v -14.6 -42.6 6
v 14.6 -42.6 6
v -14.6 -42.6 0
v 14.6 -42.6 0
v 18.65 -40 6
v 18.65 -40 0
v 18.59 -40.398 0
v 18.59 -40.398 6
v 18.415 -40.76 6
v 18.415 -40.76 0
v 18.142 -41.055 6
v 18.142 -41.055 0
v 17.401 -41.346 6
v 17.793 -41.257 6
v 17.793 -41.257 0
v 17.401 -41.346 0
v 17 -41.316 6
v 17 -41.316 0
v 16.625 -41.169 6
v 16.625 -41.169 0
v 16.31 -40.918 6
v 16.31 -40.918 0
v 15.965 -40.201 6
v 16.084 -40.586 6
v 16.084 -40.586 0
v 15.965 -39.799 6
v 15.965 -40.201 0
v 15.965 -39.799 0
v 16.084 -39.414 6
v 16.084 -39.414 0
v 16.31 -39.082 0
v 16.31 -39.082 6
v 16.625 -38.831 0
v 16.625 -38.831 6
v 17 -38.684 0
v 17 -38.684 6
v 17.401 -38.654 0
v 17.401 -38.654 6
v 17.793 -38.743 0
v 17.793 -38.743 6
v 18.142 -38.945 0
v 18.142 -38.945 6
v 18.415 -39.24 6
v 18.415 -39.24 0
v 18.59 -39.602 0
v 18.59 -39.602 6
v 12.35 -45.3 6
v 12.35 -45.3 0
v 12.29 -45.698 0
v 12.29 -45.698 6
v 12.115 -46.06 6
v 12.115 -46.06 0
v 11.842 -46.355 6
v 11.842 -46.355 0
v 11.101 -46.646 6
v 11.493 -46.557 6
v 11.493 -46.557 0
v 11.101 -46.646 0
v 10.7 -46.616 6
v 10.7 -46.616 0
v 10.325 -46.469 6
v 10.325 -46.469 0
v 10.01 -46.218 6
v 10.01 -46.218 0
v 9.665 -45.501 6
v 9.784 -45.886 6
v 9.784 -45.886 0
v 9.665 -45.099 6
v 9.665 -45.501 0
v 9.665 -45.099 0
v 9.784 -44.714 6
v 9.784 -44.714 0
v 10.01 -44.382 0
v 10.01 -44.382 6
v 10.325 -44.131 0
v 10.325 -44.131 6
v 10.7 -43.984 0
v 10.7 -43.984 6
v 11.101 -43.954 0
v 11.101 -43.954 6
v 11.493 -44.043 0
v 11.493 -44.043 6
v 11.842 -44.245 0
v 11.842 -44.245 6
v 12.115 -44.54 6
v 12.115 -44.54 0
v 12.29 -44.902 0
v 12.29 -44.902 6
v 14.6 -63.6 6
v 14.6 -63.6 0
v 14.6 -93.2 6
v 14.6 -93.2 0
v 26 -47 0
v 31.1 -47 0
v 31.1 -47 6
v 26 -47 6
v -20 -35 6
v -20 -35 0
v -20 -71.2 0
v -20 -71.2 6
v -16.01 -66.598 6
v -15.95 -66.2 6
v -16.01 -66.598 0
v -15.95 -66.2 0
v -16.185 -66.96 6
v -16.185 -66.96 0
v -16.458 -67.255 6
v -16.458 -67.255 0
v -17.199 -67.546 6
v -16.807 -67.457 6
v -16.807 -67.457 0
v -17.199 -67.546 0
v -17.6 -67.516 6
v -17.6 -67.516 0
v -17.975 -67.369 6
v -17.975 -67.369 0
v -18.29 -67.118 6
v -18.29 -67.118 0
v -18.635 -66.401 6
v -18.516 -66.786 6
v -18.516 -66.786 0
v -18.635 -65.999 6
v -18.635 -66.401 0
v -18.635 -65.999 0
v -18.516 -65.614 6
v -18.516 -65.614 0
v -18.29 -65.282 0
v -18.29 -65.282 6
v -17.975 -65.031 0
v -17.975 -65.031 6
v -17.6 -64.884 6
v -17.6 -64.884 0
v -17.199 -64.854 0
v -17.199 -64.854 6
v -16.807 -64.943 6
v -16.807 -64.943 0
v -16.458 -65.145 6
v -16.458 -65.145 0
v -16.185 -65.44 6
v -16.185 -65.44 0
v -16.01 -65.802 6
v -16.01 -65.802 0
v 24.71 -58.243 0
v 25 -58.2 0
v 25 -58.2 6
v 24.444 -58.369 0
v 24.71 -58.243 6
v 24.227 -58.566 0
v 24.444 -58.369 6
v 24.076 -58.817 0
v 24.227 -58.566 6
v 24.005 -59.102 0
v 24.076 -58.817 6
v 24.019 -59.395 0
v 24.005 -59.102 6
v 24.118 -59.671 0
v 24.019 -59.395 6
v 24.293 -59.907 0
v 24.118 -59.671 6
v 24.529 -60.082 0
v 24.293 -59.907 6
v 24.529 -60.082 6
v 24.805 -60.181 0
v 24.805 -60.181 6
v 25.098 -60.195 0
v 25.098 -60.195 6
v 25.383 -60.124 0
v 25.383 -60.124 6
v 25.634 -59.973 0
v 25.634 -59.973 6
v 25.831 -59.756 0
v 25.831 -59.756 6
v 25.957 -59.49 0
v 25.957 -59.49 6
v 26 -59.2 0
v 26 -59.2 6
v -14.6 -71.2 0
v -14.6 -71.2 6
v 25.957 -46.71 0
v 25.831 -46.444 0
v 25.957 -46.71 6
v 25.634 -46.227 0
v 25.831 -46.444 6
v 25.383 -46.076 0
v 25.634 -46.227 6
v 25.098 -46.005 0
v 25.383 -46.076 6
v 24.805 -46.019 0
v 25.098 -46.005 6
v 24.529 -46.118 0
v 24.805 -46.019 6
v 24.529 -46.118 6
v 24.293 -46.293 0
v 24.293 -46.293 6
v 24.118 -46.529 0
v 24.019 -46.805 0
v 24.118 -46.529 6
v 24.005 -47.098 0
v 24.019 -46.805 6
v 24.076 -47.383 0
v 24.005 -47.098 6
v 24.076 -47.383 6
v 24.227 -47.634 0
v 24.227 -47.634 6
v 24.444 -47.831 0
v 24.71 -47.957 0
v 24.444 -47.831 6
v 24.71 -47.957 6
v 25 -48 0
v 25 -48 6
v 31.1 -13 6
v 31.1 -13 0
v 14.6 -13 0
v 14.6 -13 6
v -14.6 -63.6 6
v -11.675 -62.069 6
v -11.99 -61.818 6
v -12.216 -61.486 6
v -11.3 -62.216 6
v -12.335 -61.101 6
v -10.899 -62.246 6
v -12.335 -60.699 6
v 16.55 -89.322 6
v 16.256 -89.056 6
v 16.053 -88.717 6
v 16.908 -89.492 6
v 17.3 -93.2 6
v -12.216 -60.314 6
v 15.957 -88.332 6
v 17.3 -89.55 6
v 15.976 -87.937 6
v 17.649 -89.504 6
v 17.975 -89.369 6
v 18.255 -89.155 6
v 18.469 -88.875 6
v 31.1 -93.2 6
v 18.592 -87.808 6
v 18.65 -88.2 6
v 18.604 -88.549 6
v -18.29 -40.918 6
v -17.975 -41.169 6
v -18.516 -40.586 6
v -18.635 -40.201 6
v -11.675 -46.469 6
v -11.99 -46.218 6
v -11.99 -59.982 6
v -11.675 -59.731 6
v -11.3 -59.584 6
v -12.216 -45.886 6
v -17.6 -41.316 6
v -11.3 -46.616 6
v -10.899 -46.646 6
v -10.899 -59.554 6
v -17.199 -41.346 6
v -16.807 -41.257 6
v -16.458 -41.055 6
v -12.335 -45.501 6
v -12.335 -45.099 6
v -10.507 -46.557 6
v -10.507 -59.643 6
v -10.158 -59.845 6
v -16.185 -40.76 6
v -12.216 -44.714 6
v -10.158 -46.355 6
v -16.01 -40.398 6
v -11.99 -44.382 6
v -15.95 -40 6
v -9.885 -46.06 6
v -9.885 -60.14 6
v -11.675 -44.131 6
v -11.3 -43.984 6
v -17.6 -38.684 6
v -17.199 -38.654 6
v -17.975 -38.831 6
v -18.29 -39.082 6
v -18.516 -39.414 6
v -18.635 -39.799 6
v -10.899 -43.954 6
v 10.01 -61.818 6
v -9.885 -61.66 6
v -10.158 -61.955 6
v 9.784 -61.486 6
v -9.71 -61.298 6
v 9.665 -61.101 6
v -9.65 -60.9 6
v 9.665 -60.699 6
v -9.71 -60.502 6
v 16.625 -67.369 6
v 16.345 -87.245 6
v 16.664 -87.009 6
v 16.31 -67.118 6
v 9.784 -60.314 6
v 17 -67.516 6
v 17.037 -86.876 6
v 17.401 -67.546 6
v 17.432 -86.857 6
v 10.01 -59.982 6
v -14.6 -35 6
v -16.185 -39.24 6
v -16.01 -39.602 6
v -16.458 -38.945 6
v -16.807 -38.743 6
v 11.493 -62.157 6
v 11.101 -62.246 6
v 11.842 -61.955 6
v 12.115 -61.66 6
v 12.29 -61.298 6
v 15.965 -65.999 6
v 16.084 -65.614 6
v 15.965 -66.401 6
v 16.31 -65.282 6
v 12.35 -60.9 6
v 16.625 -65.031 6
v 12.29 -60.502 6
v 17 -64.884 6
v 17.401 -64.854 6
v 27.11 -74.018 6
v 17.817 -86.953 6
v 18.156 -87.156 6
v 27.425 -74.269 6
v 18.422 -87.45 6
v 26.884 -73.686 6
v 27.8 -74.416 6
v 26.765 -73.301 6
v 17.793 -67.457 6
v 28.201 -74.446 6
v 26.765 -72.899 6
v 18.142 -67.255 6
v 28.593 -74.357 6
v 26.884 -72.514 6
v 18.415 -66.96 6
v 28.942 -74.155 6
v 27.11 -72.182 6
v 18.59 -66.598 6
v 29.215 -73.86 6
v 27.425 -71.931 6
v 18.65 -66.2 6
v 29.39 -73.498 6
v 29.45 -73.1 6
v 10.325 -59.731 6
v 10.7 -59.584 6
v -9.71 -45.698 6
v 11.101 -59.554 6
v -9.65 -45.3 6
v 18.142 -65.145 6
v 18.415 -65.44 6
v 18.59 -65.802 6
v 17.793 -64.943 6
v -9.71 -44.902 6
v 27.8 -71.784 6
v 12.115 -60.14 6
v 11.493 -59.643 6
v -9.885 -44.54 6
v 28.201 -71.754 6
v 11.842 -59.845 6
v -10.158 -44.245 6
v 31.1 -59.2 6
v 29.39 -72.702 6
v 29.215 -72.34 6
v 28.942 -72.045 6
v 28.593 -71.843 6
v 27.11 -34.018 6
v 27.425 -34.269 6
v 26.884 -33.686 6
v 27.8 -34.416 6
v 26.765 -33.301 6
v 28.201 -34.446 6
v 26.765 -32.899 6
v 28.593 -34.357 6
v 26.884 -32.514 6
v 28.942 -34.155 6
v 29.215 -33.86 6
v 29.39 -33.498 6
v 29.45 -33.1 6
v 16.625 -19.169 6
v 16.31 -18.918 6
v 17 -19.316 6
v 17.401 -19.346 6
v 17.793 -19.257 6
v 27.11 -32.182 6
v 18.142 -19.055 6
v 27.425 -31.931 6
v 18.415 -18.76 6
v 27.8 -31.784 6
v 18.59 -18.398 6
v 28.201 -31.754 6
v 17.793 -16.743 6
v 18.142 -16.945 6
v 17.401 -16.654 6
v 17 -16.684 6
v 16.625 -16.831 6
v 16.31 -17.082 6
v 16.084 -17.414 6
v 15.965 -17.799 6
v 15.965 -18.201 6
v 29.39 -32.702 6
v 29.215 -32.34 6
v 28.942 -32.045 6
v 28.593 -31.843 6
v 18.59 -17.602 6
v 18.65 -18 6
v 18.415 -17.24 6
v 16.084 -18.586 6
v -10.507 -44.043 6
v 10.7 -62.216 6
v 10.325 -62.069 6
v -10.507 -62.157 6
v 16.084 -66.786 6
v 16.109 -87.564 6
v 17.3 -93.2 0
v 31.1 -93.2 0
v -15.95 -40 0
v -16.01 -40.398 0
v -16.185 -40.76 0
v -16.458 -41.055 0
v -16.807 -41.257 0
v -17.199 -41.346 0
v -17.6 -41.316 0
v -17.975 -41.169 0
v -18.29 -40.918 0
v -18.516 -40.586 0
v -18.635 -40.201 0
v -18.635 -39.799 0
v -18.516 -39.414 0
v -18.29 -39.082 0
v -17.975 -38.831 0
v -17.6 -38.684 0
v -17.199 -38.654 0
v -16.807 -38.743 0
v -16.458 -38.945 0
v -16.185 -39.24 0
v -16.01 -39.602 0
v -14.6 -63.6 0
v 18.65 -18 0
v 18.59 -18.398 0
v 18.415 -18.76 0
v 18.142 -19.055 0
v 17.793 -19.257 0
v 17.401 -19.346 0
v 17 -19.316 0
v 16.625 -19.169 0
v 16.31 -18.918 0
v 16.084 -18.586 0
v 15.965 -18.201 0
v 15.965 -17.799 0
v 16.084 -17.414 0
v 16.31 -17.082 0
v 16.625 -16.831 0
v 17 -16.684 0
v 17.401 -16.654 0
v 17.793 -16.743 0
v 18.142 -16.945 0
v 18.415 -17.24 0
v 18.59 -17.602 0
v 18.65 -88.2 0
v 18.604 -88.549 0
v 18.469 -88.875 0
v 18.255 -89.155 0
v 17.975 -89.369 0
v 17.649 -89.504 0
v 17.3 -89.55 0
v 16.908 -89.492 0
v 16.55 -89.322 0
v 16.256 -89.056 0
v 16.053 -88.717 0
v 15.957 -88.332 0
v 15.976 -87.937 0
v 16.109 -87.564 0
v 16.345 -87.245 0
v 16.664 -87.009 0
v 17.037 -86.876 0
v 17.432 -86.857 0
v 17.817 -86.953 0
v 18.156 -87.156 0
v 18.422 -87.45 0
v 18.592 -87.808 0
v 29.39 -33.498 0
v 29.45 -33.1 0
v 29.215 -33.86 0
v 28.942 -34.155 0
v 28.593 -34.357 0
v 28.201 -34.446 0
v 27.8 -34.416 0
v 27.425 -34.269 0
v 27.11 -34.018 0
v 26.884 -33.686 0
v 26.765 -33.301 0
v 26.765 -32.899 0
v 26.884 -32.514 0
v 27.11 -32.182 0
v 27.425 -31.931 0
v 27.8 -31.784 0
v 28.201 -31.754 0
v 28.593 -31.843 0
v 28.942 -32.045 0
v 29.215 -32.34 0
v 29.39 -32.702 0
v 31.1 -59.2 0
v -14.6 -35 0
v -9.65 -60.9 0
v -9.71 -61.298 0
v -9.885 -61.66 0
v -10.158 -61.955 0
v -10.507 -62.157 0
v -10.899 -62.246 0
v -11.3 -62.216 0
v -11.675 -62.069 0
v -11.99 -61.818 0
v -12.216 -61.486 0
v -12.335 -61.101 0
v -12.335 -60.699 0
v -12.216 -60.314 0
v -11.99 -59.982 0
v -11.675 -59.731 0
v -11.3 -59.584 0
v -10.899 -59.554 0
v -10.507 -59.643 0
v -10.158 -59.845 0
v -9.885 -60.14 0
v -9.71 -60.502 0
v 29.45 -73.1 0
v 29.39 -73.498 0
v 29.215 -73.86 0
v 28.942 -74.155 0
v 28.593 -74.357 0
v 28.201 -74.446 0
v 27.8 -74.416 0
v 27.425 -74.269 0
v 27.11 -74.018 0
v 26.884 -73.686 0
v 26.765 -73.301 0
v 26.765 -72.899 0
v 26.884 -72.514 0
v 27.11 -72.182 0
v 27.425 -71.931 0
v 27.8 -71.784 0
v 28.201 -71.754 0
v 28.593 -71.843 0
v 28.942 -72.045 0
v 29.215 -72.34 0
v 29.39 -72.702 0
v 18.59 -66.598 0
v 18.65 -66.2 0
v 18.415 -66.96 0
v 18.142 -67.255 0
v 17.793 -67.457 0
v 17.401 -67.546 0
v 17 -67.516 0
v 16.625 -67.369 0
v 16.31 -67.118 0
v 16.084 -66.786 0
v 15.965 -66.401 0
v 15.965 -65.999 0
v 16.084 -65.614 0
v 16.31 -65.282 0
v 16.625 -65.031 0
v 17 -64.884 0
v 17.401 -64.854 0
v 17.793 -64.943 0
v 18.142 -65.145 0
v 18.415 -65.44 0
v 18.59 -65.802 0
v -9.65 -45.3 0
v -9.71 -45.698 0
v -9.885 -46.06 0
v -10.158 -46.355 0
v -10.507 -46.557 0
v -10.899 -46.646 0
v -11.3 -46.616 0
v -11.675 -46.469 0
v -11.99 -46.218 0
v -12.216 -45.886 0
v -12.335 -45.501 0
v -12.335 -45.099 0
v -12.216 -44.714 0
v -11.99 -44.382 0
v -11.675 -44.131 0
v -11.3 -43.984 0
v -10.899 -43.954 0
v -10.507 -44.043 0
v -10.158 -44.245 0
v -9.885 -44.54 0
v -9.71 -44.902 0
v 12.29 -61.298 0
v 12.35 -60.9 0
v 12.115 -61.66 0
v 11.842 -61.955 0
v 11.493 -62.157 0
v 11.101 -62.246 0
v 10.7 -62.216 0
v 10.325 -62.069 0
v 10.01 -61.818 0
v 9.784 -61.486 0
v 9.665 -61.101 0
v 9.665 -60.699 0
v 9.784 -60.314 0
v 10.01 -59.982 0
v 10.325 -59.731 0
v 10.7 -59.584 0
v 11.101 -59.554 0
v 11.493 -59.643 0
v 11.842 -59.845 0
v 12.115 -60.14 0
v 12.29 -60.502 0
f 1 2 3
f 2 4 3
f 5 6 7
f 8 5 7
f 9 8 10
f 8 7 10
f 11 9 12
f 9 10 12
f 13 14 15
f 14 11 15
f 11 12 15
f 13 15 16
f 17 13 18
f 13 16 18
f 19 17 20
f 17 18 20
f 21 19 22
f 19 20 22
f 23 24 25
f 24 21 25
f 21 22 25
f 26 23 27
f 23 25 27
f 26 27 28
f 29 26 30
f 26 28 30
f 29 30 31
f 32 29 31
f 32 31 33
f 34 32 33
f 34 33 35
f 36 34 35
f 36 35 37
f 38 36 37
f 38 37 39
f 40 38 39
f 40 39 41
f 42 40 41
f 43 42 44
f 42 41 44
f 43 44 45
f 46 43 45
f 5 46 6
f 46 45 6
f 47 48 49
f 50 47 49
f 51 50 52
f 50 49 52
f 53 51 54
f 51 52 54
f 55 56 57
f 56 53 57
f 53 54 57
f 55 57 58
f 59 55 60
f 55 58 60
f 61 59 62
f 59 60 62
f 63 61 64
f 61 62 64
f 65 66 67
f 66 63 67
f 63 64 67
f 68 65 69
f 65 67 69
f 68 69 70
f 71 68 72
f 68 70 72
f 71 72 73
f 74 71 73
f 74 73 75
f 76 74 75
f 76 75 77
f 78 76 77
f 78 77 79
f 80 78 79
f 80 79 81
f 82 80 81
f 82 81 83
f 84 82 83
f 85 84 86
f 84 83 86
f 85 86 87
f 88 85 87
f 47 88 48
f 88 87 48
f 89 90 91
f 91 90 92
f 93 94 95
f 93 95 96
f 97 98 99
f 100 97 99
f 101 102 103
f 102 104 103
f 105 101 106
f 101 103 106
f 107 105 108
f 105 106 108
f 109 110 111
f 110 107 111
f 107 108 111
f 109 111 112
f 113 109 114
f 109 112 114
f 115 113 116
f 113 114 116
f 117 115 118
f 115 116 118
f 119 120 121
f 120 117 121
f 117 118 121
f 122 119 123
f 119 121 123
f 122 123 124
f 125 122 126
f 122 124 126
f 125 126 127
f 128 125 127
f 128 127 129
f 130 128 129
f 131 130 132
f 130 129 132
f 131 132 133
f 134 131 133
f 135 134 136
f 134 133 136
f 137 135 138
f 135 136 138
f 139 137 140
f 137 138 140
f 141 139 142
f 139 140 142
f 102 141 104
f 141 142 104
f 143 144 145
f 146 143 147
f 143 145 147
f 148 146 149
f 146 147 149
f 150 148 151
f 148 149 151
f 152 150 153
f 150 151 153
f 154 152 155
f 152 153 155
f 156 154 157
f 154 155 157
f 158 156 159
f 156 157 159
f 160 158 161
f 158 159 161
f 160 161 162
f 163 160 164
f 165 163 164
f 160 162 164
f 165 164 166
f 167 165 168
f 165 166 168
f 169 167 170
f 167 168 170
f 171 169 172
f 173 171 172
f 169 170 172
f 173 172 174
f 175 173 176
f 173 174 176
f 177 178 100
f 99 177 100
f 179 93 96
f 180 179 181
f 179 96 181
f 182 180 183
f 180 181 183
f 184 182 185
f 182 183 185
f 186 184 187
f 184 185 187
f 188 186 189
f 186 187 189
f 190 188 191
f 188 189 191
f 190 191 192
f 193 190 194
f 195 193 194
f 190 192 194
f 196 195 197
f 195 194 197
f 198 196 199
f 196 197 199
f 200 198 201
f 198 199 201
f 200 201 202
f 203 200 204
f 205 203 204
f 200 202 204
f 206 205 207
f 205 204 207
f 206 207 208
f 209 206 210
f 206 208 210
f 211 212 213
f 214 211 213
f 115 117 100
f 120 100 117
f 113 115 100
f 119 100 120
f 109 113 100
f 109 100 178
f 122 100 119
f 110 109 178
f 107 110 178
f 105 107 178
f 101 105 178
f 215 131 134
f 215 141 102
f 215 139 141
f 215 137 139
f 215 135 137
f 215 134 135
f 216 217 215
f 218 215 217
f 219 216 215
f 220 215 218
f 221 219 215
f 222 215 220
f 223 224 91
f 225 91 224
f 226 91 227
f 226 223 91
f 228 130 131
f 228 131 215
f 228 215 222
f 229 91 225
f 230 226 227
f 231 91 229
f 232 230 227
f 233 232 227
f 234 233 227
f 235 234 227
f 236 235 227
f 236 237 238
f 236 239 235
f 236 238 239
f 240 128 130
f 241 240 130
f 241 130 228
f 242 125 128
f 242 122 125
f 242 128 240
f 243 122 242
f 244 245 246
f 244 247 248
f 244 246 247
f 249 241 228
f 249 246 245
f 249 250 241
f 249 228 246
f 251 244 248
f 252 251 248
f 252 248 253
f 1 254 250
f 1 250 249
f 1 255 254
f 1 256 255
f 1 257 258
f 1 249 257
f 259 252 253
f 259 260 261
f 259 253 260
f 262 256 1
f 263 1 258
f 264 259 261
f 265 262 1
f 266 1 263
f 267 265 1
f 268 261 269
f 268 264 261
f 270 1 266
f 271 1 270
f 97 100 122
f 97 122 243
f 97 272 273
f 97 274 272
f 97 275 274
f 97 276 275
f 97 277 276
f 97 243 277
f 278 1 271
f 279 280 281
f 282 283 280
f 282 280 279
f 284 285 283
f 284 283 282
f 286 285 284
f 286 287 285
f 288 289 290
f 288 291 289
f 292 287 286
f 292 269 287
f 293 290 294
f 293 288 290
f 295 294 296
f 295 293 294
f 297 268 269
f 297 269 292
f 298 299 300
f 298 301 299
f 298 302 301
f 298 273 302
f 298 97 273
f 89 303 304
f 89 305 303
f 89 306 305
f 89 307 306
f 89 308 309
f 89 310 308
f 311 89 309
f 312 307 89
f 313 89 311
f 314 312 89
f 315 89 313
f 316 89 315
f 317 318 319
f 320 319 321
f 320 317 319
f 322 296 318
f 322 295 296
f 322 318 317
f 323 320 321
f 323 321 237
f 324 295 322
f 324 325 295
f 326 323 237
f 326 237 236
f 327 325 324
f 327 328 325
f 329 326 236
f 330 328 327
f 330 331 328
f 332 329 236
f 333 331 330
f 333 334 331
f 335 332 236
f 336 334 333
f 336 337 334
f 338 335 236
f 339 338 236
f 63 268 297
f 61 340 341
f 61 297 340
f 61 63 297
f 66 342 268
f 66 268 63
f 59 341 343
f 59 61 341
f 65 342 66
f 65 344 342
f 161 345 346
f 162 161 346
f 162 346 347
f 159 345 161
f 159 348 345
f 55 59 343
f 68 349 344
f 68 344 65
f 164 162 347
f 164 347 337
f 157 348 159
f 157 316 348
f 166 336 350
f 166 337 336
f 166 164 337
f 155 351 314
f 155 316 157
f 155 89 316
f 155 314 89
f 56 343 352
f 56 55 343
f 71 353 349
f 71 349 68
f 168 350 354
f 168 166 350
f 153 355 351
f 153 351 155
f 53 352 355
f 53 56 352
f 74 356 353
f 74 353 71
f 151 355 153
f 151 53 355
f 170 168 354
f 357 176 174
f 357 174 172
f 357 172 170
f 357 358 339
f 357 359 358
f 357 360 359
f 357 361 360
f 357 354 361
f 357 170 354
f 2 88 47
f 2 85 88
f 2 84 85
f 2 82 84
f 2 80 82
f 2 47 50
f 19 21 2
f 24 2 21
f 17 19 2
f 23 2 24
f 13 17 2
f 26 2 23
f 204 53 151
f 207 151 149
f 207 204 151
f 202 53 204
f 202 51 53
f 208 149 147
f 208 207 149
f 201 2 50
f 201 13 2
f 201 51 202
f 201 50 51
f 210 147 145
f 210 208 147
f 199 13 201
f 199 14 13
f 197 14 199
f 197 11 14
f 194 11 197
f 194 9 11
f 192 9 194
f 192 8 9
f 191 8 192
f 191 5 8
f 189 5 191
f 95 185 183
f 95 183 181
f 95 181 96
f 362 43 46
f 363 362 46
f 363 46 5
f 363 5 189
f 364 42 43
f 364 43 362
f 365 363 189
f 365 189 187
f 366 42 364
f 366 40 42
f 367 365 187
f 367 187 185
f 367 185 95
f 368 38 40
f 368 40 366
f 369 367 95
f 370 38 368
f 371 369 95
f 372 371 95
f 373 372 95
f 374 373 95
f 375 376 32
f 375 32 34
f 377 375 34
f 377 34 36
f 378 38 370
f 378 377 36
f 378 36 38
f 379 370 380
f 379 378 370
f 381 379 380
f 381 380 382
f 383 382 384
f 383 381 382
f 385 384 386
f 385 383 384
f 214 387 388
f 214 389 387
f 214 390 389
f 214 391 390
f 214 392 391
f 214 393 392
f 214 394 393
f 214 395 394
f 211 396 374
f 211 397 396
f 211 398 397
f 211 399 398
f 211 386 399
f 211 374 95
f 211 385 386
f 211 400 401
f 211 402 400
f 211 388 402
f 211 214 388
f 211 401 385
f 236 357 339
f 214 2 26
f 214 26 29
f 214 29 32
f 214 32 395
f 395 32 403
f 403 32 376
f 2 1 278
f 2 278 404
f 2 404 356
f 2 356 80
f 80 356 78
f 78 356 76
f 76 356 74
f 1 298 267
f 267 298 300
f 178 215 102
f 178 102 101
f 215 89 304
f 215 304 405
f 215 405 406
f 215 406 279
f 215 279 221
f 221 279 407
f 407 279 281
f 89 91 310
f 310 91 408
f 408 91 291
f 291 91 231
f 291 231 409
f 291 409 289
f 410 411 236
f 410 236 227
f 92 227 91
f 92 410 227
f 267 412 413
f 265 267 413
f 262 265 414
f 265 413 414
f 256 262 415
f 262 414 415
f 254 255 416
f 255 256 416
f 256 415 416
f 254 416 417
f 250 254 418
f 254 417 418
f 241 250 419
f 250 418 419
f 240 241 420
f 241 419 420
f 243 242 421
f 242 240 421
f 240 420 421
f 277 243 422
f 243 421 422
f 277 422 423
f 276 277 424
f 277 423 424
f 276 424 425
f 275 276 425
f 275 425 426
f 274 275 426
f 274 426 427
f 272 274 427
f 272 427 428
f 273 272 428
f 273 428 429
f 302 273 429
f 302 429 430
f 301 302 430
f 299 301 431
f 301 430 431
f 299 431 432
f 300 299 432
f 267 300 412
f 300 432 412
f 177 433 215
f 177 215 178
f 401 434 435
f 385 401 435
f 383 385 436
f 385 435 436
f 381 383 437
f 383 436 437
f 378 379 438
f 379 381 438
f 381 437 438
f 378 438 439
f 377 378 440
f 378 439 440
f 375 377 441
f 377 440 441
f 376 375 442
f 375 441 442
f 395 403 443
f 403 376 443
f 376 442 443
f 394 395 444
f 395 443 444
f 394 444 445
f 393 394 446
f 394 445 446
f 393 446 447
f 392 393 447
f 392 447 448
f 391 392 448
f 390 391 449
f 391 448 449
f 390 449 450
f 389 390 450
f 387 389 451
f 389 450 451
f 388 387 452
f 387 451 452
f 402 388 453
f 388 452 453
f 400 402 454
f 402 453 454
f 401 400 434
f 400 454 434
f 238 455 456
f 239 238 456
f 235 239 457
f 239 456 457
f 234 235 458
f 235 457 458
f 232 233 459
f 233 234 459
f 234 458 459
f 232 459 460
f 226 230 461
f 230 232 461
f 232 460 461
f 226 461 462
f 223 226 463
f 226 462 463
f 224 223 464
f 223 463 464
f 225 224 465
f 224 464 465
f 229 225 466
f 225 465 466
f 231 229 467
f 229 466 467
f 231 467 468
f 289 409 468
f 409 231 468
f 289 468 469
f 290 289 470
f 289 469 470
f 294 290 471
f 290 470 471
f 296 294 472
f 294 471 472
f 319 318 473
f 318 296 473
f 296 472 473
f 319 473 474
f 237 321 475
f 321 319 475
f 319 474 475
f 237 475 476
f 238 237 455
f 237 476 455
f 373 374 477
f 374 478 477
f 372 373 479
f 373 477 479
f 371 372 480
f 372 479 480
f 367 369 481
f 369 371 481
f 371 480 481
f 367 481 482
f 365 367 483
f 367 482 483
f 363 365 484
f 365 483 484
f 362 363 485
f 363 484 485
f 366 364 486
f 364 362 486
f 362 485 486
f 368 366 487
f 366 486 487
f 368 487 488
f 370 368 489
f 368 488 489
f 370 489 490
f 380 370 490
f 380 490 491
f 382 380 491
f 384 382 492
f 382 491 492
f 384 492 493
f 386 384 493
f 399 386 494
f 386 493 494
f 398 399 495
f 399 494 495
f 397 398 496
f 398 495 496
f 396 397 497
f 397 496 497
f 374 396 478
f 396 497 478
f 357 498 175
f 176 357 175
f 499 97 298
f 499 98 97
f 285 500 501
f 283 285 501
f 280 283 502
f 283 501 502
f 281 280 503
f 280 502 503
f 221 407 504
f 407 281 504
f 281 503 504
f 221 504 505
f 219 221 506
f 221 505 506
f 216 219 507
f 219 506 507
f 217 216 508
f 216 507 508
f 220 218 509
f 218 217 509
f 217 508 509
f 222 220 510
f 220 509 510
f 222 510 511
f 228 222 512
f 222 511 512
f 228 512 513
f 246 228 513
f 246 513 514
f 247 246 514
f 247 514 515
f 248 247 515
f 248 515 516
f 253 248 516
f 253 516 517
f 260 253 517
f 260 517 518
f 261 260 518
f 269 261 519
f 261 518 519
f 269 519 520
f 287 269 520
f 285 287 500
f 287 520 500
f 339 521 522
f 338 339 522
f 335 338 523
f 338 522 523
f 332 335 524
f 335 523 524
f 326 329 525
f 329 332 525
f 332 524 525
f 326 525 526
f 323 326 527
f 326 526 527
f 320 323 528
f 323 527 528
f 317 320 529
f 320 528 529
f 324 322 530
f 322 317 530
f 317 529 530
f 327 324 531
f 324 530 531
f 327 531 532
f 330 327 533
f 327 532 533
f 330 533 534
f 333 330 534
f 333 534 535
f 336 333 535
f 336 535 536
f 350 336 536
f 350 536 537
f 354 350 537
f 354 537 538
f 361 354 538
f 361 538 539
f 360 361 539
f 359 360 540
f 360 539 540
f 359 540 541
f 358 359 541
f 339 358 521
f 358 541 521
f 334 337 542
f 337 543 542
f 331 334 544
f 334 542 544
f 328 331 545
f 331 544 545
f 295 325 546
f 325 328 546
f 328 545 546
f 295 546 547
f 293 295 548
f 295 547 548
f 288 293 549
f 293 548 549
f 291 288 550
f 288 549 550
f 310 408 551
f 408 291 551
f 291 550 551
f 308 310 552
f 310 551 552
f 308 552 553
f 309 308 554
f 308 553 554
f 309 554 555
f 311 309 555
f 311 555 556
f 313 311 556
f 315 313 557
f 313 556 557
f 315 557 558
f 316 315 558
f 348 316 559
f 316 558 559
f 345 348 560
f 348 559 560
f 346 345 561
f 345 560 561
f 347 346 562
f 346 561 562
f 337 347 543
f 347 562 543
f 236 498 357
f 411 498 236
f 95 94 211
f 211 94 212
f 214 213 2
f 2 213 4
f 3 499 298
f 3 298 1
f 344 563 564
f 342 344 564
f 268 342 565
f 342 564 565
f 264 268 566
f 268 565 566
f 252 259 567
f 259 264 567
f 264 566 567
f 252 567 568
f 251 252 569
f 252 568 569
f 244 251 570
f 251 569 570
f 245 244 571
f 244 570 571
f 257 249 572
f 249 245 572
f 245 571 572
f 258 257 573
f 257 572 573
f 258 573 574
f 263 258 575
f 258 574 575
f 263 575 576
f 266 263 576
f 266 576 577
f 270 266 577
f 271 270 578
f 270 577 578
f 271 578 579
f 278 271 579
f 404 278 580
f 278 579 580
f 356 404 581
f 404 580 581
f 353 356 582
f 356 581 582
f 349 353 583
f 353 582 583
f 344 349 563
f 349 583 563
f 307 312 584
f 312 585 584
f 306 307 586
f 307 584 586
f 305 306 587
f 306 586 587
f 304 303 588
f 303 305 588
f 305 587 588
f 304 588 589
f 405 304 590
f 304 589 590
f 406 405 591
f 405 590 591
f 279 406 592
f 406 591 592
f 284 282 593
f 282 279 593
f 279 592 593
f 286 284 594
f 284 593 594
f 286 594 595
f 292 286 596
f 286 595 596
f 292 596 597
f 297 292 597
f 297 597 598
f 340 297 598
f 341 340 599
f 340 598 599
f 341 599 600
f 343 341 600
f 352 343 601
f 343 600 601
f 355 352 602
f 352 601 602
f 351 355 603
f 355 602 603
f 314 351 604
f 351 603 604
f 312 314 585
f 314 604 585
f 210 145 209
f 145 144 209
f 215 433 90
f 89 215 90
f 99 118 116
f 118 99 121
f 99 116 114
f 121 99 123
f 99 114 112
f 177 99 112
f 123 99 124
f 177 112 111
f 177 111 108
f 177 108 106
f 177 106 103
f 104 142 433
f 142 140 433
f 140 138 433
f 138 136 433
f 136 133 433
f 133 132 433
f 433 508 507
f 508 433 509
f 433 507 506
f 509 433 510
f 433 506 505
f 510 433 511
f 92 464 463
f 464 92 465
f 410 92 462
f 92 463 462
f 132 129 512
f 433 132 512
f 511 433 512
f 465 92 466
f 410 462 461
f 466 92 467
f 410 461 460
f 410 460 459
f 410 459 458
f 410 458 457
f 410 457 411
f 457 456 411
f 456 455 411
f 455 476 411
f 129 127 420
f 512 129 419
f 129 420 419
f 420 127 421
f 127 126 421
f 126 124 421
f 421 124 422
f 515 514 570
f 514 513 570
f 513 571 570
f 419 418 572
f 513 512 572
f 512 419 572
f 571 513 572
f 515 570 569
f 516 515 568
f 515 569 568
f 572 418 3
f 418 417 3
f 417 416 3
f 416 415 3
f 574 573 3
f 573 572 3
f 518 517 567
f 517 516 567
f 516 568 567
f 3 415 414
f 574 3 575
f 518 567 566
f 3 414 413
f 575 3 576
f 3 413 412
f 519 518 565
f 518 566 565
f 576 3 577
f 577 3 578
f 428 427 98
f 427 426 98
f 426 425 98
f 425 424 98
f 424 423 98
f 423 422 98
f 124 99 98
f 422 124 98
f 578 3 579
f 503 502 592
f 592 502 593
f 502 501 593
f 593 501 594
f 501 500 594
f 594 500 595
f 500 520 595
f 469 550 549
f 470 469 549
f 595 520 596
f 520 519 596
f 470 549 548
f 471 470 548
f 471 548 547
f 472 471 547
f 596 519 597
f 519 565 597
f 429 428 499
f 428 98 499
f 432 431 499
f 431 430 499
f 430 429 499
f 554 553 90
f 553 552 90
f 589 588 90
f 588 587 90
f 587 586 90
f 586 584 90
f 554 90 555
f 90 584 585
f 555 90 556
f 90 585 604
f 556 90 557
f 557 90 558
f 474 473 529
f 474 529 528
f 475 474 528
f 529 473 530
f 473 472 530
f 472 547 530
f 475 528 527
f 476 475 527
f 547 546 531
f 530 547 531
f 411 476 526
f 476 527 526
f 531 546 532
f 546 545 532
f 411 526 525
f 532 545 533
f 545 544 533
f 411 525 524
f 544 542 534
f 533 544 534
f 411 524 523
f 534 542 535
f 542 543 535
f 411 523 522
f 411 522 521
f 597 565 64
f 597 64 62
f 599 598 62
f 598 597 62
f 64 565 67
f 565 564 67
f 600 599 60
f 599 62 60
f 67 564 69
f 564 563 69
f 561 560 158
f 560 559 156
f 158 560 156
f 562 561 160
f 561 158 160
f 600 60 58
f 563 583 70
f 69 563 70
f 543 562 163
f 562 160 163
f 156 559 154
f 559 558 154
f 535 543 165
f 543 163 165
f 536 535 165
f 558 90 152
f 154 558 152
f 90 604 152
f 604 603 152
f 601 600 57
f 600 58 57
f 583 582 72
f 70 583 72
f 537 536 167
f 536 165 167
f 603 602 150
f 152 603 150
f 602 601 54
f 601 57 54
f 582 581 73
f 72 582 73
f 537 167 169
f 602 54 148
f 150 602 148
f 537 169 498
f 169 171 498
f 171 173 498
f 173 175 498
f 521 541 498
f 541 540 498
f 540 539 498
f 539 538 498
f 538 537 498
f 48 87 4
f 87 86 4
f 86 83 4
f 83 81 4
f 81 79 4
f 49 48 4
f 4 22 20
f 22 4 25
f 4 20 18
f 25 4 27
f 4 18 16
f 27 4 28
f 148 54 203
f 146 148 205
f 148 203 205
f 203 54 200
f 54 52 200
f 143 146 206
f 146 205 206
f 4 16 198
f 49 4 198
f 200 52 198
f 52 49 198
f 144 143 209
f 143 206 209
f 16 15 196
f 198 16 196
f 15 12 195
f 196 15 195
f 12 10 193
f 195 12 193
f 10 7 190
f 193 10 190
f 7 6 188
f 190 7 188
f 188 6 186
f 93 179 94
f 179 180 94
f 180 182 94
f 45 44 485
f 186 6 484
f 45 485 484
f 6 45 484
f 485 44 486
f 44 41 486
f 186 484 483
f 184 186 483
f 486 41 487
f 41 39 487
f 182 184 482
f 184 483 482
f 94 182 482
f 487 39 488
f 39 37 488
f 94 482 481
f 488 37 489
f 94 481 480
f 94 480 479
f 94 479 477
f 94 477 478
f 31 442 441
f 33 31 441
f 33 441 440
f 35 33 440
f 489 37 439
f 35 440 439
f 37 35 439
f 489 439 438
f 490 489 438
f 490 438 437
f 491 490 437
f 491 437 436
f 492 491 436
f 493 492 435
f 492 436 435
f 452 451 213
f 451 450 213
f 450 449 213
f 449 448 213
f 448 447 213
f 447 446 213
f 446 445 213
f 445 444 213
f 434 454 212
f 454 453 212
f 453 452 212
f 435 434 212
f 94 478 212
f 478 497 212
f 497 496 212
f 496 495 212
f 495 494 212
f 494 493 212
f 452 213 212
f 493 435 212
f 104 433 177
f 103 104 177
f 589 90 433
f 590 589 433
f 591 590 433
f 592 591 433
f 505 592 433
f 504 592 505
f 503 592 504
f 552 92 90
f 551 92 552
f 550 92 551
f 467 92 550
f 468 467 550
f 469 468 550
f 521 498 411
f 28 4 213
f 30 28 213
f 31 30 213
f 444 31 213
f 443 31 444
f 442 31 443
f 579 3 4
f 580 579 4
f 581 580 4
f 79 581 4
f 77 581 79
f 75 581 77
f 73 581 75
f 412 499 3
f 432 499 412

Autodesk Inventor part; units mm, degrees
ref_plane "YZ Plane" through (0, 0, 0) normal (1, 0, 0) x (0, 1, 0)
ref_plane "XZ Plane" through (0, 0, 0) normal (0, 1, 0) x (-1, 0, 0)
ref_plane "XY Plane" through (0, 0, 0) normal (0, 0, 1) x (1, 0, 0)
ref_plane "작업 평면1" through (0, 0, 0) normal (0, 0, 1) x (1, 0, 0)
sketch "스케치1" plane through (0, 0, 0) normal (0, 0, 1) x (1, 0, 0)
  arc A0 (-19.5808, 6.2636) -> (-20.1, 4.5766) centre (-17.1, 4.5766) ccw projected
  line L0 (-20.1, -39.6766) -> (-20.1, 4.5766) projected
  arc A1 (-20.1, -39.6766) -> (-19.5808, -41.3636) centre (-17.1, -39.6766) ccw projected
  line L1 (-15.8929, -46.7869) -> (-19.5808, -41.3636) projected
  arc A2 (-15.8929, -46.7869) -> (-13.4121, -48.1) centre (-13.4121, -45.1) ccw projected
  line L2 (13.4121, -48.1) -> (-13.4121, -48.1) projected
  arc A3 (13.4121, -48.1) -> (15.8929, -46.7869) centre (13.4121, -45.1) ccw projected
  line L3 (19.5808, -41.3636) -> (15.8929, -46.7869) projected
  arc A4 (19.5808, -41.3636) -> (20.1, -39.6766) centre (17.1, -39.6766) ccw projected
  line L4 (20.1, 4.5766) -> (20.1, -39.6766) projected
  arc A5 (20.1, 4.5766) -> (19.5808, 6.2636) centre (17.1, 4.5766) ccw projected
  line L5 (15.5953, 12.1246) -> (19.5808, 6.2636) projected
  arc A6 (15.5953, 12.1246) -> (13.9414, 13) centre (13.9414, 11) ccw projected
  line L6 (7.65, 13) -> (13.9414, 13) projected
  arc A7 (9.15, 11.5) -> (7.65, 13) centre (7.65, 11.5) ccw projected
  line L7 (9.15, 11.5) -> (9.15, 10) projected
  arc A8 (9.15, 10) -> (11.5, 7.65) centre (11.5, 10) ccw projected
  line L8 (11.5, 7.65) -> (13.5, 7.65) projected
  arc A9 (14.5, 6.65) -> (13.5, 7.65) centre (13.5, 6.65) ccw projected
  line L9 (14.5, 6.65) -> (14.5, -36.15) projected
  arc A10 (13.5, -37.15) -> (14.5, -36.15) centre (13.5, -36.15) ccw projected
  line L10 (13.5, -37.15) -> (11.5, -37.15) projected
  arc A11 (11.5, -37.15) -> (9.15, -39.5) centre (11.5, -39.5) ccw projected
  line L11 (9.15, -39.5) -> (9.15, -41.5) projected
  arc A12 (8.15, -42.5) -> (9.15, -41.5) centre (8.15, -41.5) ccw projected
  line L12 (8.15, -42.5) -> (-8.15, -42.5) projected
  arc A13 (-9.15, -41.5) -> (-8.15, -42.5) centre (-8.15, -41.5) ccw projected
  line L13 (-9.15, -41.5) -> (-9.15, -39.5) projected
  arc A14 (-9.15, -39.5) -> (-11.5, -37.15) centre (-11.5, -39.5) ccw projected
  line L14 (-11.5, -37.15) -> (-13.5, -37.15) projected
  arc A15 (-14.5, -36.15) -> (-13.5, -37.15) centre (-13.5, -36.15) ccw projected
  line L15 (-14.5, -36.15) -> (-14.5, 6.65) projected
  arc A16 (-13.5, 7.65) -> (-14.5, 6.65) centre (-13.5, 6.65) ccw projected
  line L16 (-13.5, 7.65) -> (-11.5, 7.65) projected
  arc A17 (-11.5, 7.65) -> (-9.15, 10) centre (-11.5, 10) ccw projected
  line L17 (-9.15, 10) -> (-9.15, 11.5) projected
  arc A18 (-7.65, 13) -> (-9.15, 11.5) centre (-7.65, 11.5) ccw projected
  line L18 (-13.9414, 13) -> (-7.65, 13) projected
  arc A19 (-13.9414, 13) -> (-15.5953, 12.1246) centre (-13.9414, 11) ccw projected
  line L19 (-19.5808, 6.2636) -> (-15.5953, 12.1246) projected
  circle A20 centre (17.3, 4) radius 1.35 projected
  circle A21 centre (17.3, -18) radius 1.35 projected
  circle A22 centre (11, -45.3) radius 1.35 projected
  circle A23 centre (-17.3, 4) radius 1.35 projected
  circle A24 centre (-17.3, -18) radius 1.35 projected
  circle A25 centre (-11, -45.3) radius 1.35 projected
  circle A26 centre (17.3, -40) radius 1.35 projected
  circle A27 centre (-17.3, -40) radius 1.35 projected
  arc A28 (19.5808, -112.4636) -> (20.1, -110.7766) centre (17.1, -110.7766) ccw projected
  line L20 (20.1, -66.5234) -> (20.1, -110.7766) projected
  arc A29 (20.1, -66.5234) -> (19.5808, -64.8364) centre (17.1, -66.5234) ccw projected
  line L21 (15.8929, -59.4131) -> (19.5808, -64.8364) projected
  arc A30 (15.8929, -59.4131) -> (13.4121, -58.1) centre (13.4121, -61.1) ccw projected
  line L22 (-13.4121, -58.1) -> (13.4121, -58.1) projected
  arc A31 (-13.4121, -58.1) -> (-15.8929, -59.4131) centre (-13.4121, -61.1) ccw projected
  line L23 (-19.5808, -64.8364) -> (-15.8929, -59.4131) projected
  arc A32 (-19.5808, -64.8364) -> (-20.1, -66.5234) centre (-17.1, -66.5234) ccw projected
  line L24 (-20.1, -110.7766) -> (-20.1, -66.5234) projected
  arc A33 (-20.1, -110.7766) -> (-19.5808, -112.4636) centre (-17.1, -110.7766) ccw projected
  line L25 (-15.5953, -118.3246) -> (-19.5808, -112.4636) projected
  arc A34 (-15.5953, -118.3246) -> (-13.9414, -119.2) centre (-13.9414, -117.2) ccw projected
  line L26 (-7.65, -119.2) -> (-13.9414, -119.2) projected
  arc A35 (-9.15, -117.7) -> (-7.65, -119.2) centre (-7.65, -117.7) ccw projected
  line L27 (-9.15, -117.7) -> (-9.15, -116.2) projected
  arc A36 (-9.15, -116.2) -> (-11.5, -113.85) centre (-11.5, -116.2) ccw projected
  line L28 (-11.5, -113.85) -> (-13.5, -113.85) projected
  arc A37 (-14.5, -112.85) -> (-13.5, -113.85) centre (-13.5, -112.85) ccw projected
  line L29 (-14.5, -112.85) -> (-14.5, -70.05) projected
  arc A38 (-13.5, -69.05) -> (-14.5, -70.05) centre (-13.5, -70.05) ccw projected
  line L30 (-13.5, -69.05) -> (-11.5, -69.05) projected
  arc A39 (-11.5, -69.05) -> (-9.15, -66.7) centre (-11.5, -66.7) ccw projected
  line L31 (-9.15, -66.7) -> (-9.15, -64.7) projected
  arc A40 (-8.15, -63.7) -> (-9.15, -64.7) centre (-8.15, -64.7) ccw projected
  line L32 (-8.15, -63.7) -> (8.15, -63.7) projected
  arc A41 (9.15, -64.7) -> (8.15, -63.7) centre (8.15, -64.7) ccw projected
  line L33 (9.15, -64.7) -> (9.15, -66.7) projected
  arc A42 (9.15, -66.7) -> (11.5, -69.05) centre (11.5, -66.7) ccw projected
  line L34 (11.5, -69.05) -> (13.5, -69.05) projected
  arc A43 (14.5, -70.05) -> (13.5, -69.05) centre (13.5, -70.05) ccw projected
  line L35 (14.5, -70.05) -> (14.5, -112.85) projected
  arc A44 (13.5, -113.85) -> (14.5, -112.85) centre (13.5, -112.85) ccw projected
  line L36 (13.5, -113.85) -> (11.5, -113.85) projected
  arc A45 (11.5, -113.85) -> (9.15, -116.2) centre (11.5, -116.2) ccw projected
  line L37 (9.15, -116.2) -> (9.15, -117.7) projected
  arc A46 (7.65, -119.2) -> (9.15, -117.7) centre (7.65, -117.7) ccw projected
  line L38 (13.9414, -119.2) -> (7.65, -119.2) projected
  arc A47 (13.9414, -119.2) -> (15.5953, -118.3246) centre (13.9414, -117.2) ccw projected
  line L39 (19.5808, -112.4636) -> (15.5953, -118.3246) projected
  circle A48 centre (-17.3, -110.2) radius 1.35 projected
  circle A49 centre (-17.3, -88.2) radius 1.35 projected
  circle A50 centre (-11, -60.9) radius 1.35 projected
  circle A51 centre (17.3, -110.2) radius 1.35 projected
  circle A52 centre (17.3, -88.2) radius 1.35 projected
  circle A53 centre (11, -60.9) radius 1.35 projected
  circle A54 centre (-17.3, -66.2) radius 1.35 projected
  circle A55 centre (17.3, -66.2) radius 1.35 projected
  line L40 (14.6, -36.15) -> (14.6, 6.65)
  arc A56 (14.6, 6.65) -> (13.5, 7.75) centre (13.5, 6.65) ccw
  line L41 (13.5, 7.75) -> (11.5, 7.75)
  arc A57 (9.25, 10) -> (11.5, 7.75) centre (11.5, 10) ccw
  line L42 (9.25, 10) -> (9.25, 11.5)
  arc A58 (9.25, 11.5) -> (8.4246, 12.9) centre (7.65, 11.5) ccw
  line L43 (8.4246, 12.9) -> (13.9414, 12.9)
  arc A59 (15.5126, 12.0684) -> (13.9414, 12.9) centre (13.9414, 11) ccw
  line L44 (15.5126, 12.0684) -> (19.4981, 6.2073)
  arc A60 (20, 4.5766) -> (19.4981, 6.2073) centre (17.1, 4.5766) ccw
  line L45 (20, 4.5766) -> (20, -13)
  arc A61 (14.5, -47.7882) -> (14.6, -47.7455) centre (13.4121, -45.1) ccw
  arc A62 (-14.6, -47.7455) -> (-14.5, -47.7882) centre (-13.4121, -45.1) ccw
  line L46 (-20, -13) -> (-20, 4.5766)
  arc A63 (-19.4981, 6.2073) -> (-20, 4.5766) centre (-17.1, 4.5766) ccw
  line L47 (-19.4981, 6.2073) -> (-15.5126, 12.0684)
  arc A64 (-13.9414, 12.9) -> (-15.5126, 12.0684) centre (-13.9414, 11) ccw
  line L48 (-13.9414, 12.9) -> (-8.4246, 12.9)
  arc A65 (-8.4246, 12.9) -> (-9.25, 11.5) centre (-7.65, 11.5) ccw
  line L49 (-9.25, 11.5) -> (-9.25, 10)
  arc A66 (-11.5, 7.75) -> (-9.25, 10) centre (-11.5, 10) ccw
  line L50 (-11.5, 7.75) -> (-13.5, 7.75)
  arc A67 (-13.5, 7.75) -> (-14.6, 6.65) centre (-13.5, 6.65) ccw
  line L51 (-14.6, 6.65) -> (-14.6, -36.15)
  arc A68 (-14.6, -36.15) -> (-13.5, -37.25) centre (-13.5, -36.15) ccw
  line L52 (-13.5, -37.25) -> (-11.5, -37.25)
  arc A69 (-9.25, -39.5) -> (-11.5, -37.25) centre (-11.5, -39.5) ccw
  line L53 (-9.25, -39.5) -> (-9.25, -41.5)
  arc A70 (-9.25, -41.5) -> (-8.15, -42.6) centre (-8.15, -41.5) ccw
  line L54 (-8.15, -42.6) -> (8.15, -42.6)
  arc A71 (8.15, -42.6) -> (9.25, -41.5) centre (8.15, -41.5) ccw
  line L55 (9.25, -41.5) -> (9.25, -39.5)
  arc A72 (11.5, -37.25) -> (9.25, -39.5) centre (11.5, -39.5) ccw
  line L56 (11.5, -37.25) -> (13.5, -37.25)
  arc A73 (13.5, -37.25) -> (14.6, -36.15) centre (13.5, -36.15) ccw
  line L57 (17.3, -88.2) -> (17.3, -93.2)
  line L58 (17.3, -93.2) -> (20, -93.2)
  line L59 (17.3, -13) -> (20, -13)
  line L60 (17.3, -13) -> (14.6, -13)
  line L61 (17.3, -93.2) -> (14.6, -93.2)
  line L62 (14.6, -13) -> (14.6, -93.2)
  line L63 (20, -13) -> (30, -13)
  line L64 (25, -93.2) -> (20, -93.2)
  circle A74 centre (17.3, -18) radius 1.35
  circle A75 centre (17.3, -40) radius 1.35
  circle A76 centre (17.3, -66.2) radius 1.35
  circle A77 centre (17.3, -88.2) radius 1.35
  line L65 (-14.6, -13) -> (-14.6, -93.2)
  line L66 (14.6, -93.2) -> (14.5, -93.2)
  line L67 (-14.6, -93.2) -> (-20.1, -93.2)
  line L68 (-14.6, -13) -> (-14.5, -13) construction
  line L69 (14.5, -13) -> (65.6, -13) construction
  line L70 (14.6, -13) -> (14.5, -13)
  line L71 (-14.5, -13) -> (-20, -13)
  line L72 (-20, -13) -> (-20.1, -13)
  line L73 (-20.1, -93.2) -> (-20, -93.2)
  circle A78 centre (-17.3, -18) radius 1.35
  circle A79 centre (-17.3, -40) radius 1.35
  circle A80 centre (-17.3, -88.2) radius 1.35
  line L74 (30, -13) -> (35, -13)
  line L75 (35, -13) -> (35, -93.2)
  line L76 (35, -93.2) -> (30, -93.2)
  line L77 (30, -26.0412) -> (30, -25.8633)
  line L78 (30, -25.8633) -> (30, -26.0412)
  line L79 (30, -37.25) -> (30, -37.15)
  line L80 (30, -37.15) -> (30, -37.25)
  line L81 (30, -42.5) -> (30, -42.6)
  line L82 (30, -48) -> (30, -48.1)
  line L83 (35, -47) -> (28.9, -47)
  line L84 (28.9, -59.2) -> (35, -59.2)
  line L85 (35, -59.2) -> (35, -47)
  line L86 (25, -93.2) -> (25, -13)
  line L87 (25, -47) -> (31.1, -47)
  line L88 (31.1, -47) -> (31.1, -59.2)
  line L89 (31.1, -59.2) -> (25, -59.2)
  line L90 (25, -59.2) -> (25, -47)
  line L91 (31.1, -47) -> (31.1, -13)
  line L92 (31.1, -59.2) -> (31.1, -93.2)
  line L93 (25, -93.2) -> (30, -93.2)
  circle A81 centre (28.1, -33.1) radius 1.35
  circle A82 centre (28.1, -73.1) radius 1.35
  line L94 (8.15, -42.6) -> (14.6, -42.6)
  line L95 (8.15, -63.6) -> (-8.15, -63.6)
  arc A83 (-8.15, -63.6) -> (-9.25, -64.7) centre (-8.15, -64.7) ccw
  line L96 (-9.25, -64.7) -> (-9.25, -66.7)
  arc A84 (-11.5, -68.95) -> (-9.25, -66.7) centre (-11.5, -66.7) ccw
  line L97 (-11.5, -68.95) -> (-13.5, -68.95)
  arc A85 (-13.5, -68.95) -> (-14.6, -70.05) centre (-13.5, -70.05) ccw
  line L98 (-14.6, -70.05) -> (-14.6, -112.85)
  arc A86 (-14.6, -112.85) -> (-13.5, -113.95) centre (-13.5, -112.85) ccw
  line L99 (-13.5, -113.95) -> (-11.5, -113.95)
  arc A87 (-9.25, -116.2) -> (-11.5, -113.95) centre (-11.5, -116.2) ccw
  line L100 (-9.25, -116.2) -> (-9.25, -117.7)
  arc A88 (-9.25, -117.7) -> (-8.4246, -119.1) centre (-7.65, -117.7) ccw
  line L101 (-8.4246, -119.1) -> (-13.9414, -119.1)
  arc A89 (-15.5126, -118.2684) -> (-13.9414, -119.1) centre (-13.9414, -117.2) ccw
  line L102 (-15.5126, -118.2684) -> (-19.4981, -112.4073)
  arc A90 (-20, -110.7766) -> (-19.4981, -112.4073) centre (-17.1, -110.7766) ccw
  line L103 (-20, -110.7766) -> (-20, -66.5234)
  arc A91 (15.8102, -59.4693) -> (14.6, -58.4545) centre (13.4121, -61.1) ccw
  line L104 (15.8102, -59.4693) -> (19.4981, -64.8927)
  arc A92 (20, -66.5234) -> (19.4981, -64.8927) centre (17.1, -66.5234) ccw
  line L105 (20, -66.5234) -> (20, -110.7766)
  arc A93 (19.4981, -112.4073) -> (20, -110.7766) centre (17.1, -110.7766) ccw
  line L106 (19.4981, -112.4073) -> (15.5126, -118.2684)
  arc A94 (13.9414, -119.1) -> (15.5126, -118.2684) centre (13.9414, -117.2) ccw
  line L107 (13.9414, -119.1) -> (8.4246, -119.1)
  arc A95 (8.4246, -119.1) -> (9.25, -117.7) centre (7.65, -117.7) ccw
  line L108 (9.25, -117.7) -> (9.25, -116.2)
  arc A96 (11.5, -113.95) -> (9.25, -116.2) centre (11.5, -116.2) ccw
  line L109 (11.5, -113.95) -> (13.5, -113.95)
  arc A97 (13.5, -113.95) -> (14.6, -112.85) centre (13.5, -112.85) ccw
  line L110 (14.6, -112.85) -> (14.6, -70.05)
  arc A98 (14.6, -70.05) -> (13.5, -68.95) centre (13.5, -70.05) ccw
  line L111 (13.5, -68.95) -> (11.5, -68.95)
  arc A99 (9.25, -66.7) -> (11.5, -68.95) centre (11.5, -66.7) ccw
  line L112 (9.25, -66.7) -> (9.25, -64.7)
  arc A100 (9.25, -64.7) -> (8.15, -63.6) centre (8.15, -64.7) ccw
  line L113 (14.6, -42.6) -> (-9.25, -42.6)
  line L114 (-9.25, -63.6) -> (14.6, -63.6)
  line L115 (14.6, -63.6) -> (14.6, -42.6)
  circle A101 centre (11, -45.3) radius 1.35
  circle A102 centre (11, -60.9) radius 1.35
  circle A103 centre (-11, -45.3) radius 1.35
  circle A104 centre (-11, -60.9) radius 1.35
  line L116 (-9.25, -42.6) -> (-14.6, -42.6)
  line L117 (-14.6, -42.6) -> (-14.6, -63.6)
  line L118 (-14.6, -63.6) -> (-9.25, -63.6)
  line L119 (-20, -13) -> (-20, -93.2)
  circle A105 centre (-17.3, -66.2) radius 1.35
  line L120 (-20, -35) -> (-14.6, -35)
  line L121 (-17.3, -71.2) -> (-14.6, -71.2)
  line L122 (-17.3, -71.2) -> (-20, -71.2)
  point P0 (0, 0)
  point P1 (30, -93.2)
  point P2 (25, -13)
  point P3 (-8.15, -42.6)
  point P4 (-14.6, -42.6)
  dimension "d0" = 0.1
  dimension "d2" = 5
  dimension "d3" = 5
  dimension "d4" = 5
  dimension "d5" = 2.7
  dimension "d6" = 2.7
  dimension "d7" = 2.7
  dimension "d8" = 2.7
  dimension "d11" = 2.7
  dimension "d12" = 2.7
  dimension "d14" = 2.7
  dimension "d16" = 6.1
  dimension "d17" = 12.2
  dimension "d31" = 6.1
  dimension "d36" = 2.7
  dimension "d37" = 2.7
  dimension "d40" = 0.1
  dimension "d41" = 2.7
  dimension "d42" = 2.7
  dimension "d43" = 2.7
  dimension "d44" = 2.7
extrude "돌출5" add sketch "스케치1" along normal blind 6 contours L119 L120 L51 L65 A2 L1 A1 | A1 L1 A2 L65 A31 L23 A32 L119 | A32 L23 A31 L65 L121 L122 L103 L119 | L65 L116 L113 L54 L94 L62 A3 L2 A2 | A2 L2 A3 L62 A30 L22 A31 L65 | A31 L22 A30 L62 L114 L95 L118 L65 | L62 L40 L60 L59 L63 L4 A4 L3 A3 | A3 L3 A4 L4 L63 L86 L64 L20 A29 L21 A30 L62 | A30 L21 A29 L20 L64 L105 A92 L104 A91 L62 | A91 L104 A92 L105 L58 L61 L62 | L63 L74 L91 L83 L87 L86 | L86 L89 L84 L92 L76 L93
sketch "스케치2" plane through (0, 0, 6) normal (0, 0, 1) x (1, 0, 0)
  line L0 (25, -47) -> (31.1, -47) projected
  line L1 (25, -59.2) -> (25, -47) projected
  line L2 (31.1, -59.2) -> (25, -59.2) projected
  circle A0 centre (25, -47) radius 1
  circle A1 centre (25, -59.2) radius 1
  point P0 (0, 0)
  dimension "d49" = 2
  dimension "d50" = 2
extrude "돌출6" cut sketch "스케치2" against normal blind 6
properties part number "hip joint connector" material "PMMA 플라스틱"
